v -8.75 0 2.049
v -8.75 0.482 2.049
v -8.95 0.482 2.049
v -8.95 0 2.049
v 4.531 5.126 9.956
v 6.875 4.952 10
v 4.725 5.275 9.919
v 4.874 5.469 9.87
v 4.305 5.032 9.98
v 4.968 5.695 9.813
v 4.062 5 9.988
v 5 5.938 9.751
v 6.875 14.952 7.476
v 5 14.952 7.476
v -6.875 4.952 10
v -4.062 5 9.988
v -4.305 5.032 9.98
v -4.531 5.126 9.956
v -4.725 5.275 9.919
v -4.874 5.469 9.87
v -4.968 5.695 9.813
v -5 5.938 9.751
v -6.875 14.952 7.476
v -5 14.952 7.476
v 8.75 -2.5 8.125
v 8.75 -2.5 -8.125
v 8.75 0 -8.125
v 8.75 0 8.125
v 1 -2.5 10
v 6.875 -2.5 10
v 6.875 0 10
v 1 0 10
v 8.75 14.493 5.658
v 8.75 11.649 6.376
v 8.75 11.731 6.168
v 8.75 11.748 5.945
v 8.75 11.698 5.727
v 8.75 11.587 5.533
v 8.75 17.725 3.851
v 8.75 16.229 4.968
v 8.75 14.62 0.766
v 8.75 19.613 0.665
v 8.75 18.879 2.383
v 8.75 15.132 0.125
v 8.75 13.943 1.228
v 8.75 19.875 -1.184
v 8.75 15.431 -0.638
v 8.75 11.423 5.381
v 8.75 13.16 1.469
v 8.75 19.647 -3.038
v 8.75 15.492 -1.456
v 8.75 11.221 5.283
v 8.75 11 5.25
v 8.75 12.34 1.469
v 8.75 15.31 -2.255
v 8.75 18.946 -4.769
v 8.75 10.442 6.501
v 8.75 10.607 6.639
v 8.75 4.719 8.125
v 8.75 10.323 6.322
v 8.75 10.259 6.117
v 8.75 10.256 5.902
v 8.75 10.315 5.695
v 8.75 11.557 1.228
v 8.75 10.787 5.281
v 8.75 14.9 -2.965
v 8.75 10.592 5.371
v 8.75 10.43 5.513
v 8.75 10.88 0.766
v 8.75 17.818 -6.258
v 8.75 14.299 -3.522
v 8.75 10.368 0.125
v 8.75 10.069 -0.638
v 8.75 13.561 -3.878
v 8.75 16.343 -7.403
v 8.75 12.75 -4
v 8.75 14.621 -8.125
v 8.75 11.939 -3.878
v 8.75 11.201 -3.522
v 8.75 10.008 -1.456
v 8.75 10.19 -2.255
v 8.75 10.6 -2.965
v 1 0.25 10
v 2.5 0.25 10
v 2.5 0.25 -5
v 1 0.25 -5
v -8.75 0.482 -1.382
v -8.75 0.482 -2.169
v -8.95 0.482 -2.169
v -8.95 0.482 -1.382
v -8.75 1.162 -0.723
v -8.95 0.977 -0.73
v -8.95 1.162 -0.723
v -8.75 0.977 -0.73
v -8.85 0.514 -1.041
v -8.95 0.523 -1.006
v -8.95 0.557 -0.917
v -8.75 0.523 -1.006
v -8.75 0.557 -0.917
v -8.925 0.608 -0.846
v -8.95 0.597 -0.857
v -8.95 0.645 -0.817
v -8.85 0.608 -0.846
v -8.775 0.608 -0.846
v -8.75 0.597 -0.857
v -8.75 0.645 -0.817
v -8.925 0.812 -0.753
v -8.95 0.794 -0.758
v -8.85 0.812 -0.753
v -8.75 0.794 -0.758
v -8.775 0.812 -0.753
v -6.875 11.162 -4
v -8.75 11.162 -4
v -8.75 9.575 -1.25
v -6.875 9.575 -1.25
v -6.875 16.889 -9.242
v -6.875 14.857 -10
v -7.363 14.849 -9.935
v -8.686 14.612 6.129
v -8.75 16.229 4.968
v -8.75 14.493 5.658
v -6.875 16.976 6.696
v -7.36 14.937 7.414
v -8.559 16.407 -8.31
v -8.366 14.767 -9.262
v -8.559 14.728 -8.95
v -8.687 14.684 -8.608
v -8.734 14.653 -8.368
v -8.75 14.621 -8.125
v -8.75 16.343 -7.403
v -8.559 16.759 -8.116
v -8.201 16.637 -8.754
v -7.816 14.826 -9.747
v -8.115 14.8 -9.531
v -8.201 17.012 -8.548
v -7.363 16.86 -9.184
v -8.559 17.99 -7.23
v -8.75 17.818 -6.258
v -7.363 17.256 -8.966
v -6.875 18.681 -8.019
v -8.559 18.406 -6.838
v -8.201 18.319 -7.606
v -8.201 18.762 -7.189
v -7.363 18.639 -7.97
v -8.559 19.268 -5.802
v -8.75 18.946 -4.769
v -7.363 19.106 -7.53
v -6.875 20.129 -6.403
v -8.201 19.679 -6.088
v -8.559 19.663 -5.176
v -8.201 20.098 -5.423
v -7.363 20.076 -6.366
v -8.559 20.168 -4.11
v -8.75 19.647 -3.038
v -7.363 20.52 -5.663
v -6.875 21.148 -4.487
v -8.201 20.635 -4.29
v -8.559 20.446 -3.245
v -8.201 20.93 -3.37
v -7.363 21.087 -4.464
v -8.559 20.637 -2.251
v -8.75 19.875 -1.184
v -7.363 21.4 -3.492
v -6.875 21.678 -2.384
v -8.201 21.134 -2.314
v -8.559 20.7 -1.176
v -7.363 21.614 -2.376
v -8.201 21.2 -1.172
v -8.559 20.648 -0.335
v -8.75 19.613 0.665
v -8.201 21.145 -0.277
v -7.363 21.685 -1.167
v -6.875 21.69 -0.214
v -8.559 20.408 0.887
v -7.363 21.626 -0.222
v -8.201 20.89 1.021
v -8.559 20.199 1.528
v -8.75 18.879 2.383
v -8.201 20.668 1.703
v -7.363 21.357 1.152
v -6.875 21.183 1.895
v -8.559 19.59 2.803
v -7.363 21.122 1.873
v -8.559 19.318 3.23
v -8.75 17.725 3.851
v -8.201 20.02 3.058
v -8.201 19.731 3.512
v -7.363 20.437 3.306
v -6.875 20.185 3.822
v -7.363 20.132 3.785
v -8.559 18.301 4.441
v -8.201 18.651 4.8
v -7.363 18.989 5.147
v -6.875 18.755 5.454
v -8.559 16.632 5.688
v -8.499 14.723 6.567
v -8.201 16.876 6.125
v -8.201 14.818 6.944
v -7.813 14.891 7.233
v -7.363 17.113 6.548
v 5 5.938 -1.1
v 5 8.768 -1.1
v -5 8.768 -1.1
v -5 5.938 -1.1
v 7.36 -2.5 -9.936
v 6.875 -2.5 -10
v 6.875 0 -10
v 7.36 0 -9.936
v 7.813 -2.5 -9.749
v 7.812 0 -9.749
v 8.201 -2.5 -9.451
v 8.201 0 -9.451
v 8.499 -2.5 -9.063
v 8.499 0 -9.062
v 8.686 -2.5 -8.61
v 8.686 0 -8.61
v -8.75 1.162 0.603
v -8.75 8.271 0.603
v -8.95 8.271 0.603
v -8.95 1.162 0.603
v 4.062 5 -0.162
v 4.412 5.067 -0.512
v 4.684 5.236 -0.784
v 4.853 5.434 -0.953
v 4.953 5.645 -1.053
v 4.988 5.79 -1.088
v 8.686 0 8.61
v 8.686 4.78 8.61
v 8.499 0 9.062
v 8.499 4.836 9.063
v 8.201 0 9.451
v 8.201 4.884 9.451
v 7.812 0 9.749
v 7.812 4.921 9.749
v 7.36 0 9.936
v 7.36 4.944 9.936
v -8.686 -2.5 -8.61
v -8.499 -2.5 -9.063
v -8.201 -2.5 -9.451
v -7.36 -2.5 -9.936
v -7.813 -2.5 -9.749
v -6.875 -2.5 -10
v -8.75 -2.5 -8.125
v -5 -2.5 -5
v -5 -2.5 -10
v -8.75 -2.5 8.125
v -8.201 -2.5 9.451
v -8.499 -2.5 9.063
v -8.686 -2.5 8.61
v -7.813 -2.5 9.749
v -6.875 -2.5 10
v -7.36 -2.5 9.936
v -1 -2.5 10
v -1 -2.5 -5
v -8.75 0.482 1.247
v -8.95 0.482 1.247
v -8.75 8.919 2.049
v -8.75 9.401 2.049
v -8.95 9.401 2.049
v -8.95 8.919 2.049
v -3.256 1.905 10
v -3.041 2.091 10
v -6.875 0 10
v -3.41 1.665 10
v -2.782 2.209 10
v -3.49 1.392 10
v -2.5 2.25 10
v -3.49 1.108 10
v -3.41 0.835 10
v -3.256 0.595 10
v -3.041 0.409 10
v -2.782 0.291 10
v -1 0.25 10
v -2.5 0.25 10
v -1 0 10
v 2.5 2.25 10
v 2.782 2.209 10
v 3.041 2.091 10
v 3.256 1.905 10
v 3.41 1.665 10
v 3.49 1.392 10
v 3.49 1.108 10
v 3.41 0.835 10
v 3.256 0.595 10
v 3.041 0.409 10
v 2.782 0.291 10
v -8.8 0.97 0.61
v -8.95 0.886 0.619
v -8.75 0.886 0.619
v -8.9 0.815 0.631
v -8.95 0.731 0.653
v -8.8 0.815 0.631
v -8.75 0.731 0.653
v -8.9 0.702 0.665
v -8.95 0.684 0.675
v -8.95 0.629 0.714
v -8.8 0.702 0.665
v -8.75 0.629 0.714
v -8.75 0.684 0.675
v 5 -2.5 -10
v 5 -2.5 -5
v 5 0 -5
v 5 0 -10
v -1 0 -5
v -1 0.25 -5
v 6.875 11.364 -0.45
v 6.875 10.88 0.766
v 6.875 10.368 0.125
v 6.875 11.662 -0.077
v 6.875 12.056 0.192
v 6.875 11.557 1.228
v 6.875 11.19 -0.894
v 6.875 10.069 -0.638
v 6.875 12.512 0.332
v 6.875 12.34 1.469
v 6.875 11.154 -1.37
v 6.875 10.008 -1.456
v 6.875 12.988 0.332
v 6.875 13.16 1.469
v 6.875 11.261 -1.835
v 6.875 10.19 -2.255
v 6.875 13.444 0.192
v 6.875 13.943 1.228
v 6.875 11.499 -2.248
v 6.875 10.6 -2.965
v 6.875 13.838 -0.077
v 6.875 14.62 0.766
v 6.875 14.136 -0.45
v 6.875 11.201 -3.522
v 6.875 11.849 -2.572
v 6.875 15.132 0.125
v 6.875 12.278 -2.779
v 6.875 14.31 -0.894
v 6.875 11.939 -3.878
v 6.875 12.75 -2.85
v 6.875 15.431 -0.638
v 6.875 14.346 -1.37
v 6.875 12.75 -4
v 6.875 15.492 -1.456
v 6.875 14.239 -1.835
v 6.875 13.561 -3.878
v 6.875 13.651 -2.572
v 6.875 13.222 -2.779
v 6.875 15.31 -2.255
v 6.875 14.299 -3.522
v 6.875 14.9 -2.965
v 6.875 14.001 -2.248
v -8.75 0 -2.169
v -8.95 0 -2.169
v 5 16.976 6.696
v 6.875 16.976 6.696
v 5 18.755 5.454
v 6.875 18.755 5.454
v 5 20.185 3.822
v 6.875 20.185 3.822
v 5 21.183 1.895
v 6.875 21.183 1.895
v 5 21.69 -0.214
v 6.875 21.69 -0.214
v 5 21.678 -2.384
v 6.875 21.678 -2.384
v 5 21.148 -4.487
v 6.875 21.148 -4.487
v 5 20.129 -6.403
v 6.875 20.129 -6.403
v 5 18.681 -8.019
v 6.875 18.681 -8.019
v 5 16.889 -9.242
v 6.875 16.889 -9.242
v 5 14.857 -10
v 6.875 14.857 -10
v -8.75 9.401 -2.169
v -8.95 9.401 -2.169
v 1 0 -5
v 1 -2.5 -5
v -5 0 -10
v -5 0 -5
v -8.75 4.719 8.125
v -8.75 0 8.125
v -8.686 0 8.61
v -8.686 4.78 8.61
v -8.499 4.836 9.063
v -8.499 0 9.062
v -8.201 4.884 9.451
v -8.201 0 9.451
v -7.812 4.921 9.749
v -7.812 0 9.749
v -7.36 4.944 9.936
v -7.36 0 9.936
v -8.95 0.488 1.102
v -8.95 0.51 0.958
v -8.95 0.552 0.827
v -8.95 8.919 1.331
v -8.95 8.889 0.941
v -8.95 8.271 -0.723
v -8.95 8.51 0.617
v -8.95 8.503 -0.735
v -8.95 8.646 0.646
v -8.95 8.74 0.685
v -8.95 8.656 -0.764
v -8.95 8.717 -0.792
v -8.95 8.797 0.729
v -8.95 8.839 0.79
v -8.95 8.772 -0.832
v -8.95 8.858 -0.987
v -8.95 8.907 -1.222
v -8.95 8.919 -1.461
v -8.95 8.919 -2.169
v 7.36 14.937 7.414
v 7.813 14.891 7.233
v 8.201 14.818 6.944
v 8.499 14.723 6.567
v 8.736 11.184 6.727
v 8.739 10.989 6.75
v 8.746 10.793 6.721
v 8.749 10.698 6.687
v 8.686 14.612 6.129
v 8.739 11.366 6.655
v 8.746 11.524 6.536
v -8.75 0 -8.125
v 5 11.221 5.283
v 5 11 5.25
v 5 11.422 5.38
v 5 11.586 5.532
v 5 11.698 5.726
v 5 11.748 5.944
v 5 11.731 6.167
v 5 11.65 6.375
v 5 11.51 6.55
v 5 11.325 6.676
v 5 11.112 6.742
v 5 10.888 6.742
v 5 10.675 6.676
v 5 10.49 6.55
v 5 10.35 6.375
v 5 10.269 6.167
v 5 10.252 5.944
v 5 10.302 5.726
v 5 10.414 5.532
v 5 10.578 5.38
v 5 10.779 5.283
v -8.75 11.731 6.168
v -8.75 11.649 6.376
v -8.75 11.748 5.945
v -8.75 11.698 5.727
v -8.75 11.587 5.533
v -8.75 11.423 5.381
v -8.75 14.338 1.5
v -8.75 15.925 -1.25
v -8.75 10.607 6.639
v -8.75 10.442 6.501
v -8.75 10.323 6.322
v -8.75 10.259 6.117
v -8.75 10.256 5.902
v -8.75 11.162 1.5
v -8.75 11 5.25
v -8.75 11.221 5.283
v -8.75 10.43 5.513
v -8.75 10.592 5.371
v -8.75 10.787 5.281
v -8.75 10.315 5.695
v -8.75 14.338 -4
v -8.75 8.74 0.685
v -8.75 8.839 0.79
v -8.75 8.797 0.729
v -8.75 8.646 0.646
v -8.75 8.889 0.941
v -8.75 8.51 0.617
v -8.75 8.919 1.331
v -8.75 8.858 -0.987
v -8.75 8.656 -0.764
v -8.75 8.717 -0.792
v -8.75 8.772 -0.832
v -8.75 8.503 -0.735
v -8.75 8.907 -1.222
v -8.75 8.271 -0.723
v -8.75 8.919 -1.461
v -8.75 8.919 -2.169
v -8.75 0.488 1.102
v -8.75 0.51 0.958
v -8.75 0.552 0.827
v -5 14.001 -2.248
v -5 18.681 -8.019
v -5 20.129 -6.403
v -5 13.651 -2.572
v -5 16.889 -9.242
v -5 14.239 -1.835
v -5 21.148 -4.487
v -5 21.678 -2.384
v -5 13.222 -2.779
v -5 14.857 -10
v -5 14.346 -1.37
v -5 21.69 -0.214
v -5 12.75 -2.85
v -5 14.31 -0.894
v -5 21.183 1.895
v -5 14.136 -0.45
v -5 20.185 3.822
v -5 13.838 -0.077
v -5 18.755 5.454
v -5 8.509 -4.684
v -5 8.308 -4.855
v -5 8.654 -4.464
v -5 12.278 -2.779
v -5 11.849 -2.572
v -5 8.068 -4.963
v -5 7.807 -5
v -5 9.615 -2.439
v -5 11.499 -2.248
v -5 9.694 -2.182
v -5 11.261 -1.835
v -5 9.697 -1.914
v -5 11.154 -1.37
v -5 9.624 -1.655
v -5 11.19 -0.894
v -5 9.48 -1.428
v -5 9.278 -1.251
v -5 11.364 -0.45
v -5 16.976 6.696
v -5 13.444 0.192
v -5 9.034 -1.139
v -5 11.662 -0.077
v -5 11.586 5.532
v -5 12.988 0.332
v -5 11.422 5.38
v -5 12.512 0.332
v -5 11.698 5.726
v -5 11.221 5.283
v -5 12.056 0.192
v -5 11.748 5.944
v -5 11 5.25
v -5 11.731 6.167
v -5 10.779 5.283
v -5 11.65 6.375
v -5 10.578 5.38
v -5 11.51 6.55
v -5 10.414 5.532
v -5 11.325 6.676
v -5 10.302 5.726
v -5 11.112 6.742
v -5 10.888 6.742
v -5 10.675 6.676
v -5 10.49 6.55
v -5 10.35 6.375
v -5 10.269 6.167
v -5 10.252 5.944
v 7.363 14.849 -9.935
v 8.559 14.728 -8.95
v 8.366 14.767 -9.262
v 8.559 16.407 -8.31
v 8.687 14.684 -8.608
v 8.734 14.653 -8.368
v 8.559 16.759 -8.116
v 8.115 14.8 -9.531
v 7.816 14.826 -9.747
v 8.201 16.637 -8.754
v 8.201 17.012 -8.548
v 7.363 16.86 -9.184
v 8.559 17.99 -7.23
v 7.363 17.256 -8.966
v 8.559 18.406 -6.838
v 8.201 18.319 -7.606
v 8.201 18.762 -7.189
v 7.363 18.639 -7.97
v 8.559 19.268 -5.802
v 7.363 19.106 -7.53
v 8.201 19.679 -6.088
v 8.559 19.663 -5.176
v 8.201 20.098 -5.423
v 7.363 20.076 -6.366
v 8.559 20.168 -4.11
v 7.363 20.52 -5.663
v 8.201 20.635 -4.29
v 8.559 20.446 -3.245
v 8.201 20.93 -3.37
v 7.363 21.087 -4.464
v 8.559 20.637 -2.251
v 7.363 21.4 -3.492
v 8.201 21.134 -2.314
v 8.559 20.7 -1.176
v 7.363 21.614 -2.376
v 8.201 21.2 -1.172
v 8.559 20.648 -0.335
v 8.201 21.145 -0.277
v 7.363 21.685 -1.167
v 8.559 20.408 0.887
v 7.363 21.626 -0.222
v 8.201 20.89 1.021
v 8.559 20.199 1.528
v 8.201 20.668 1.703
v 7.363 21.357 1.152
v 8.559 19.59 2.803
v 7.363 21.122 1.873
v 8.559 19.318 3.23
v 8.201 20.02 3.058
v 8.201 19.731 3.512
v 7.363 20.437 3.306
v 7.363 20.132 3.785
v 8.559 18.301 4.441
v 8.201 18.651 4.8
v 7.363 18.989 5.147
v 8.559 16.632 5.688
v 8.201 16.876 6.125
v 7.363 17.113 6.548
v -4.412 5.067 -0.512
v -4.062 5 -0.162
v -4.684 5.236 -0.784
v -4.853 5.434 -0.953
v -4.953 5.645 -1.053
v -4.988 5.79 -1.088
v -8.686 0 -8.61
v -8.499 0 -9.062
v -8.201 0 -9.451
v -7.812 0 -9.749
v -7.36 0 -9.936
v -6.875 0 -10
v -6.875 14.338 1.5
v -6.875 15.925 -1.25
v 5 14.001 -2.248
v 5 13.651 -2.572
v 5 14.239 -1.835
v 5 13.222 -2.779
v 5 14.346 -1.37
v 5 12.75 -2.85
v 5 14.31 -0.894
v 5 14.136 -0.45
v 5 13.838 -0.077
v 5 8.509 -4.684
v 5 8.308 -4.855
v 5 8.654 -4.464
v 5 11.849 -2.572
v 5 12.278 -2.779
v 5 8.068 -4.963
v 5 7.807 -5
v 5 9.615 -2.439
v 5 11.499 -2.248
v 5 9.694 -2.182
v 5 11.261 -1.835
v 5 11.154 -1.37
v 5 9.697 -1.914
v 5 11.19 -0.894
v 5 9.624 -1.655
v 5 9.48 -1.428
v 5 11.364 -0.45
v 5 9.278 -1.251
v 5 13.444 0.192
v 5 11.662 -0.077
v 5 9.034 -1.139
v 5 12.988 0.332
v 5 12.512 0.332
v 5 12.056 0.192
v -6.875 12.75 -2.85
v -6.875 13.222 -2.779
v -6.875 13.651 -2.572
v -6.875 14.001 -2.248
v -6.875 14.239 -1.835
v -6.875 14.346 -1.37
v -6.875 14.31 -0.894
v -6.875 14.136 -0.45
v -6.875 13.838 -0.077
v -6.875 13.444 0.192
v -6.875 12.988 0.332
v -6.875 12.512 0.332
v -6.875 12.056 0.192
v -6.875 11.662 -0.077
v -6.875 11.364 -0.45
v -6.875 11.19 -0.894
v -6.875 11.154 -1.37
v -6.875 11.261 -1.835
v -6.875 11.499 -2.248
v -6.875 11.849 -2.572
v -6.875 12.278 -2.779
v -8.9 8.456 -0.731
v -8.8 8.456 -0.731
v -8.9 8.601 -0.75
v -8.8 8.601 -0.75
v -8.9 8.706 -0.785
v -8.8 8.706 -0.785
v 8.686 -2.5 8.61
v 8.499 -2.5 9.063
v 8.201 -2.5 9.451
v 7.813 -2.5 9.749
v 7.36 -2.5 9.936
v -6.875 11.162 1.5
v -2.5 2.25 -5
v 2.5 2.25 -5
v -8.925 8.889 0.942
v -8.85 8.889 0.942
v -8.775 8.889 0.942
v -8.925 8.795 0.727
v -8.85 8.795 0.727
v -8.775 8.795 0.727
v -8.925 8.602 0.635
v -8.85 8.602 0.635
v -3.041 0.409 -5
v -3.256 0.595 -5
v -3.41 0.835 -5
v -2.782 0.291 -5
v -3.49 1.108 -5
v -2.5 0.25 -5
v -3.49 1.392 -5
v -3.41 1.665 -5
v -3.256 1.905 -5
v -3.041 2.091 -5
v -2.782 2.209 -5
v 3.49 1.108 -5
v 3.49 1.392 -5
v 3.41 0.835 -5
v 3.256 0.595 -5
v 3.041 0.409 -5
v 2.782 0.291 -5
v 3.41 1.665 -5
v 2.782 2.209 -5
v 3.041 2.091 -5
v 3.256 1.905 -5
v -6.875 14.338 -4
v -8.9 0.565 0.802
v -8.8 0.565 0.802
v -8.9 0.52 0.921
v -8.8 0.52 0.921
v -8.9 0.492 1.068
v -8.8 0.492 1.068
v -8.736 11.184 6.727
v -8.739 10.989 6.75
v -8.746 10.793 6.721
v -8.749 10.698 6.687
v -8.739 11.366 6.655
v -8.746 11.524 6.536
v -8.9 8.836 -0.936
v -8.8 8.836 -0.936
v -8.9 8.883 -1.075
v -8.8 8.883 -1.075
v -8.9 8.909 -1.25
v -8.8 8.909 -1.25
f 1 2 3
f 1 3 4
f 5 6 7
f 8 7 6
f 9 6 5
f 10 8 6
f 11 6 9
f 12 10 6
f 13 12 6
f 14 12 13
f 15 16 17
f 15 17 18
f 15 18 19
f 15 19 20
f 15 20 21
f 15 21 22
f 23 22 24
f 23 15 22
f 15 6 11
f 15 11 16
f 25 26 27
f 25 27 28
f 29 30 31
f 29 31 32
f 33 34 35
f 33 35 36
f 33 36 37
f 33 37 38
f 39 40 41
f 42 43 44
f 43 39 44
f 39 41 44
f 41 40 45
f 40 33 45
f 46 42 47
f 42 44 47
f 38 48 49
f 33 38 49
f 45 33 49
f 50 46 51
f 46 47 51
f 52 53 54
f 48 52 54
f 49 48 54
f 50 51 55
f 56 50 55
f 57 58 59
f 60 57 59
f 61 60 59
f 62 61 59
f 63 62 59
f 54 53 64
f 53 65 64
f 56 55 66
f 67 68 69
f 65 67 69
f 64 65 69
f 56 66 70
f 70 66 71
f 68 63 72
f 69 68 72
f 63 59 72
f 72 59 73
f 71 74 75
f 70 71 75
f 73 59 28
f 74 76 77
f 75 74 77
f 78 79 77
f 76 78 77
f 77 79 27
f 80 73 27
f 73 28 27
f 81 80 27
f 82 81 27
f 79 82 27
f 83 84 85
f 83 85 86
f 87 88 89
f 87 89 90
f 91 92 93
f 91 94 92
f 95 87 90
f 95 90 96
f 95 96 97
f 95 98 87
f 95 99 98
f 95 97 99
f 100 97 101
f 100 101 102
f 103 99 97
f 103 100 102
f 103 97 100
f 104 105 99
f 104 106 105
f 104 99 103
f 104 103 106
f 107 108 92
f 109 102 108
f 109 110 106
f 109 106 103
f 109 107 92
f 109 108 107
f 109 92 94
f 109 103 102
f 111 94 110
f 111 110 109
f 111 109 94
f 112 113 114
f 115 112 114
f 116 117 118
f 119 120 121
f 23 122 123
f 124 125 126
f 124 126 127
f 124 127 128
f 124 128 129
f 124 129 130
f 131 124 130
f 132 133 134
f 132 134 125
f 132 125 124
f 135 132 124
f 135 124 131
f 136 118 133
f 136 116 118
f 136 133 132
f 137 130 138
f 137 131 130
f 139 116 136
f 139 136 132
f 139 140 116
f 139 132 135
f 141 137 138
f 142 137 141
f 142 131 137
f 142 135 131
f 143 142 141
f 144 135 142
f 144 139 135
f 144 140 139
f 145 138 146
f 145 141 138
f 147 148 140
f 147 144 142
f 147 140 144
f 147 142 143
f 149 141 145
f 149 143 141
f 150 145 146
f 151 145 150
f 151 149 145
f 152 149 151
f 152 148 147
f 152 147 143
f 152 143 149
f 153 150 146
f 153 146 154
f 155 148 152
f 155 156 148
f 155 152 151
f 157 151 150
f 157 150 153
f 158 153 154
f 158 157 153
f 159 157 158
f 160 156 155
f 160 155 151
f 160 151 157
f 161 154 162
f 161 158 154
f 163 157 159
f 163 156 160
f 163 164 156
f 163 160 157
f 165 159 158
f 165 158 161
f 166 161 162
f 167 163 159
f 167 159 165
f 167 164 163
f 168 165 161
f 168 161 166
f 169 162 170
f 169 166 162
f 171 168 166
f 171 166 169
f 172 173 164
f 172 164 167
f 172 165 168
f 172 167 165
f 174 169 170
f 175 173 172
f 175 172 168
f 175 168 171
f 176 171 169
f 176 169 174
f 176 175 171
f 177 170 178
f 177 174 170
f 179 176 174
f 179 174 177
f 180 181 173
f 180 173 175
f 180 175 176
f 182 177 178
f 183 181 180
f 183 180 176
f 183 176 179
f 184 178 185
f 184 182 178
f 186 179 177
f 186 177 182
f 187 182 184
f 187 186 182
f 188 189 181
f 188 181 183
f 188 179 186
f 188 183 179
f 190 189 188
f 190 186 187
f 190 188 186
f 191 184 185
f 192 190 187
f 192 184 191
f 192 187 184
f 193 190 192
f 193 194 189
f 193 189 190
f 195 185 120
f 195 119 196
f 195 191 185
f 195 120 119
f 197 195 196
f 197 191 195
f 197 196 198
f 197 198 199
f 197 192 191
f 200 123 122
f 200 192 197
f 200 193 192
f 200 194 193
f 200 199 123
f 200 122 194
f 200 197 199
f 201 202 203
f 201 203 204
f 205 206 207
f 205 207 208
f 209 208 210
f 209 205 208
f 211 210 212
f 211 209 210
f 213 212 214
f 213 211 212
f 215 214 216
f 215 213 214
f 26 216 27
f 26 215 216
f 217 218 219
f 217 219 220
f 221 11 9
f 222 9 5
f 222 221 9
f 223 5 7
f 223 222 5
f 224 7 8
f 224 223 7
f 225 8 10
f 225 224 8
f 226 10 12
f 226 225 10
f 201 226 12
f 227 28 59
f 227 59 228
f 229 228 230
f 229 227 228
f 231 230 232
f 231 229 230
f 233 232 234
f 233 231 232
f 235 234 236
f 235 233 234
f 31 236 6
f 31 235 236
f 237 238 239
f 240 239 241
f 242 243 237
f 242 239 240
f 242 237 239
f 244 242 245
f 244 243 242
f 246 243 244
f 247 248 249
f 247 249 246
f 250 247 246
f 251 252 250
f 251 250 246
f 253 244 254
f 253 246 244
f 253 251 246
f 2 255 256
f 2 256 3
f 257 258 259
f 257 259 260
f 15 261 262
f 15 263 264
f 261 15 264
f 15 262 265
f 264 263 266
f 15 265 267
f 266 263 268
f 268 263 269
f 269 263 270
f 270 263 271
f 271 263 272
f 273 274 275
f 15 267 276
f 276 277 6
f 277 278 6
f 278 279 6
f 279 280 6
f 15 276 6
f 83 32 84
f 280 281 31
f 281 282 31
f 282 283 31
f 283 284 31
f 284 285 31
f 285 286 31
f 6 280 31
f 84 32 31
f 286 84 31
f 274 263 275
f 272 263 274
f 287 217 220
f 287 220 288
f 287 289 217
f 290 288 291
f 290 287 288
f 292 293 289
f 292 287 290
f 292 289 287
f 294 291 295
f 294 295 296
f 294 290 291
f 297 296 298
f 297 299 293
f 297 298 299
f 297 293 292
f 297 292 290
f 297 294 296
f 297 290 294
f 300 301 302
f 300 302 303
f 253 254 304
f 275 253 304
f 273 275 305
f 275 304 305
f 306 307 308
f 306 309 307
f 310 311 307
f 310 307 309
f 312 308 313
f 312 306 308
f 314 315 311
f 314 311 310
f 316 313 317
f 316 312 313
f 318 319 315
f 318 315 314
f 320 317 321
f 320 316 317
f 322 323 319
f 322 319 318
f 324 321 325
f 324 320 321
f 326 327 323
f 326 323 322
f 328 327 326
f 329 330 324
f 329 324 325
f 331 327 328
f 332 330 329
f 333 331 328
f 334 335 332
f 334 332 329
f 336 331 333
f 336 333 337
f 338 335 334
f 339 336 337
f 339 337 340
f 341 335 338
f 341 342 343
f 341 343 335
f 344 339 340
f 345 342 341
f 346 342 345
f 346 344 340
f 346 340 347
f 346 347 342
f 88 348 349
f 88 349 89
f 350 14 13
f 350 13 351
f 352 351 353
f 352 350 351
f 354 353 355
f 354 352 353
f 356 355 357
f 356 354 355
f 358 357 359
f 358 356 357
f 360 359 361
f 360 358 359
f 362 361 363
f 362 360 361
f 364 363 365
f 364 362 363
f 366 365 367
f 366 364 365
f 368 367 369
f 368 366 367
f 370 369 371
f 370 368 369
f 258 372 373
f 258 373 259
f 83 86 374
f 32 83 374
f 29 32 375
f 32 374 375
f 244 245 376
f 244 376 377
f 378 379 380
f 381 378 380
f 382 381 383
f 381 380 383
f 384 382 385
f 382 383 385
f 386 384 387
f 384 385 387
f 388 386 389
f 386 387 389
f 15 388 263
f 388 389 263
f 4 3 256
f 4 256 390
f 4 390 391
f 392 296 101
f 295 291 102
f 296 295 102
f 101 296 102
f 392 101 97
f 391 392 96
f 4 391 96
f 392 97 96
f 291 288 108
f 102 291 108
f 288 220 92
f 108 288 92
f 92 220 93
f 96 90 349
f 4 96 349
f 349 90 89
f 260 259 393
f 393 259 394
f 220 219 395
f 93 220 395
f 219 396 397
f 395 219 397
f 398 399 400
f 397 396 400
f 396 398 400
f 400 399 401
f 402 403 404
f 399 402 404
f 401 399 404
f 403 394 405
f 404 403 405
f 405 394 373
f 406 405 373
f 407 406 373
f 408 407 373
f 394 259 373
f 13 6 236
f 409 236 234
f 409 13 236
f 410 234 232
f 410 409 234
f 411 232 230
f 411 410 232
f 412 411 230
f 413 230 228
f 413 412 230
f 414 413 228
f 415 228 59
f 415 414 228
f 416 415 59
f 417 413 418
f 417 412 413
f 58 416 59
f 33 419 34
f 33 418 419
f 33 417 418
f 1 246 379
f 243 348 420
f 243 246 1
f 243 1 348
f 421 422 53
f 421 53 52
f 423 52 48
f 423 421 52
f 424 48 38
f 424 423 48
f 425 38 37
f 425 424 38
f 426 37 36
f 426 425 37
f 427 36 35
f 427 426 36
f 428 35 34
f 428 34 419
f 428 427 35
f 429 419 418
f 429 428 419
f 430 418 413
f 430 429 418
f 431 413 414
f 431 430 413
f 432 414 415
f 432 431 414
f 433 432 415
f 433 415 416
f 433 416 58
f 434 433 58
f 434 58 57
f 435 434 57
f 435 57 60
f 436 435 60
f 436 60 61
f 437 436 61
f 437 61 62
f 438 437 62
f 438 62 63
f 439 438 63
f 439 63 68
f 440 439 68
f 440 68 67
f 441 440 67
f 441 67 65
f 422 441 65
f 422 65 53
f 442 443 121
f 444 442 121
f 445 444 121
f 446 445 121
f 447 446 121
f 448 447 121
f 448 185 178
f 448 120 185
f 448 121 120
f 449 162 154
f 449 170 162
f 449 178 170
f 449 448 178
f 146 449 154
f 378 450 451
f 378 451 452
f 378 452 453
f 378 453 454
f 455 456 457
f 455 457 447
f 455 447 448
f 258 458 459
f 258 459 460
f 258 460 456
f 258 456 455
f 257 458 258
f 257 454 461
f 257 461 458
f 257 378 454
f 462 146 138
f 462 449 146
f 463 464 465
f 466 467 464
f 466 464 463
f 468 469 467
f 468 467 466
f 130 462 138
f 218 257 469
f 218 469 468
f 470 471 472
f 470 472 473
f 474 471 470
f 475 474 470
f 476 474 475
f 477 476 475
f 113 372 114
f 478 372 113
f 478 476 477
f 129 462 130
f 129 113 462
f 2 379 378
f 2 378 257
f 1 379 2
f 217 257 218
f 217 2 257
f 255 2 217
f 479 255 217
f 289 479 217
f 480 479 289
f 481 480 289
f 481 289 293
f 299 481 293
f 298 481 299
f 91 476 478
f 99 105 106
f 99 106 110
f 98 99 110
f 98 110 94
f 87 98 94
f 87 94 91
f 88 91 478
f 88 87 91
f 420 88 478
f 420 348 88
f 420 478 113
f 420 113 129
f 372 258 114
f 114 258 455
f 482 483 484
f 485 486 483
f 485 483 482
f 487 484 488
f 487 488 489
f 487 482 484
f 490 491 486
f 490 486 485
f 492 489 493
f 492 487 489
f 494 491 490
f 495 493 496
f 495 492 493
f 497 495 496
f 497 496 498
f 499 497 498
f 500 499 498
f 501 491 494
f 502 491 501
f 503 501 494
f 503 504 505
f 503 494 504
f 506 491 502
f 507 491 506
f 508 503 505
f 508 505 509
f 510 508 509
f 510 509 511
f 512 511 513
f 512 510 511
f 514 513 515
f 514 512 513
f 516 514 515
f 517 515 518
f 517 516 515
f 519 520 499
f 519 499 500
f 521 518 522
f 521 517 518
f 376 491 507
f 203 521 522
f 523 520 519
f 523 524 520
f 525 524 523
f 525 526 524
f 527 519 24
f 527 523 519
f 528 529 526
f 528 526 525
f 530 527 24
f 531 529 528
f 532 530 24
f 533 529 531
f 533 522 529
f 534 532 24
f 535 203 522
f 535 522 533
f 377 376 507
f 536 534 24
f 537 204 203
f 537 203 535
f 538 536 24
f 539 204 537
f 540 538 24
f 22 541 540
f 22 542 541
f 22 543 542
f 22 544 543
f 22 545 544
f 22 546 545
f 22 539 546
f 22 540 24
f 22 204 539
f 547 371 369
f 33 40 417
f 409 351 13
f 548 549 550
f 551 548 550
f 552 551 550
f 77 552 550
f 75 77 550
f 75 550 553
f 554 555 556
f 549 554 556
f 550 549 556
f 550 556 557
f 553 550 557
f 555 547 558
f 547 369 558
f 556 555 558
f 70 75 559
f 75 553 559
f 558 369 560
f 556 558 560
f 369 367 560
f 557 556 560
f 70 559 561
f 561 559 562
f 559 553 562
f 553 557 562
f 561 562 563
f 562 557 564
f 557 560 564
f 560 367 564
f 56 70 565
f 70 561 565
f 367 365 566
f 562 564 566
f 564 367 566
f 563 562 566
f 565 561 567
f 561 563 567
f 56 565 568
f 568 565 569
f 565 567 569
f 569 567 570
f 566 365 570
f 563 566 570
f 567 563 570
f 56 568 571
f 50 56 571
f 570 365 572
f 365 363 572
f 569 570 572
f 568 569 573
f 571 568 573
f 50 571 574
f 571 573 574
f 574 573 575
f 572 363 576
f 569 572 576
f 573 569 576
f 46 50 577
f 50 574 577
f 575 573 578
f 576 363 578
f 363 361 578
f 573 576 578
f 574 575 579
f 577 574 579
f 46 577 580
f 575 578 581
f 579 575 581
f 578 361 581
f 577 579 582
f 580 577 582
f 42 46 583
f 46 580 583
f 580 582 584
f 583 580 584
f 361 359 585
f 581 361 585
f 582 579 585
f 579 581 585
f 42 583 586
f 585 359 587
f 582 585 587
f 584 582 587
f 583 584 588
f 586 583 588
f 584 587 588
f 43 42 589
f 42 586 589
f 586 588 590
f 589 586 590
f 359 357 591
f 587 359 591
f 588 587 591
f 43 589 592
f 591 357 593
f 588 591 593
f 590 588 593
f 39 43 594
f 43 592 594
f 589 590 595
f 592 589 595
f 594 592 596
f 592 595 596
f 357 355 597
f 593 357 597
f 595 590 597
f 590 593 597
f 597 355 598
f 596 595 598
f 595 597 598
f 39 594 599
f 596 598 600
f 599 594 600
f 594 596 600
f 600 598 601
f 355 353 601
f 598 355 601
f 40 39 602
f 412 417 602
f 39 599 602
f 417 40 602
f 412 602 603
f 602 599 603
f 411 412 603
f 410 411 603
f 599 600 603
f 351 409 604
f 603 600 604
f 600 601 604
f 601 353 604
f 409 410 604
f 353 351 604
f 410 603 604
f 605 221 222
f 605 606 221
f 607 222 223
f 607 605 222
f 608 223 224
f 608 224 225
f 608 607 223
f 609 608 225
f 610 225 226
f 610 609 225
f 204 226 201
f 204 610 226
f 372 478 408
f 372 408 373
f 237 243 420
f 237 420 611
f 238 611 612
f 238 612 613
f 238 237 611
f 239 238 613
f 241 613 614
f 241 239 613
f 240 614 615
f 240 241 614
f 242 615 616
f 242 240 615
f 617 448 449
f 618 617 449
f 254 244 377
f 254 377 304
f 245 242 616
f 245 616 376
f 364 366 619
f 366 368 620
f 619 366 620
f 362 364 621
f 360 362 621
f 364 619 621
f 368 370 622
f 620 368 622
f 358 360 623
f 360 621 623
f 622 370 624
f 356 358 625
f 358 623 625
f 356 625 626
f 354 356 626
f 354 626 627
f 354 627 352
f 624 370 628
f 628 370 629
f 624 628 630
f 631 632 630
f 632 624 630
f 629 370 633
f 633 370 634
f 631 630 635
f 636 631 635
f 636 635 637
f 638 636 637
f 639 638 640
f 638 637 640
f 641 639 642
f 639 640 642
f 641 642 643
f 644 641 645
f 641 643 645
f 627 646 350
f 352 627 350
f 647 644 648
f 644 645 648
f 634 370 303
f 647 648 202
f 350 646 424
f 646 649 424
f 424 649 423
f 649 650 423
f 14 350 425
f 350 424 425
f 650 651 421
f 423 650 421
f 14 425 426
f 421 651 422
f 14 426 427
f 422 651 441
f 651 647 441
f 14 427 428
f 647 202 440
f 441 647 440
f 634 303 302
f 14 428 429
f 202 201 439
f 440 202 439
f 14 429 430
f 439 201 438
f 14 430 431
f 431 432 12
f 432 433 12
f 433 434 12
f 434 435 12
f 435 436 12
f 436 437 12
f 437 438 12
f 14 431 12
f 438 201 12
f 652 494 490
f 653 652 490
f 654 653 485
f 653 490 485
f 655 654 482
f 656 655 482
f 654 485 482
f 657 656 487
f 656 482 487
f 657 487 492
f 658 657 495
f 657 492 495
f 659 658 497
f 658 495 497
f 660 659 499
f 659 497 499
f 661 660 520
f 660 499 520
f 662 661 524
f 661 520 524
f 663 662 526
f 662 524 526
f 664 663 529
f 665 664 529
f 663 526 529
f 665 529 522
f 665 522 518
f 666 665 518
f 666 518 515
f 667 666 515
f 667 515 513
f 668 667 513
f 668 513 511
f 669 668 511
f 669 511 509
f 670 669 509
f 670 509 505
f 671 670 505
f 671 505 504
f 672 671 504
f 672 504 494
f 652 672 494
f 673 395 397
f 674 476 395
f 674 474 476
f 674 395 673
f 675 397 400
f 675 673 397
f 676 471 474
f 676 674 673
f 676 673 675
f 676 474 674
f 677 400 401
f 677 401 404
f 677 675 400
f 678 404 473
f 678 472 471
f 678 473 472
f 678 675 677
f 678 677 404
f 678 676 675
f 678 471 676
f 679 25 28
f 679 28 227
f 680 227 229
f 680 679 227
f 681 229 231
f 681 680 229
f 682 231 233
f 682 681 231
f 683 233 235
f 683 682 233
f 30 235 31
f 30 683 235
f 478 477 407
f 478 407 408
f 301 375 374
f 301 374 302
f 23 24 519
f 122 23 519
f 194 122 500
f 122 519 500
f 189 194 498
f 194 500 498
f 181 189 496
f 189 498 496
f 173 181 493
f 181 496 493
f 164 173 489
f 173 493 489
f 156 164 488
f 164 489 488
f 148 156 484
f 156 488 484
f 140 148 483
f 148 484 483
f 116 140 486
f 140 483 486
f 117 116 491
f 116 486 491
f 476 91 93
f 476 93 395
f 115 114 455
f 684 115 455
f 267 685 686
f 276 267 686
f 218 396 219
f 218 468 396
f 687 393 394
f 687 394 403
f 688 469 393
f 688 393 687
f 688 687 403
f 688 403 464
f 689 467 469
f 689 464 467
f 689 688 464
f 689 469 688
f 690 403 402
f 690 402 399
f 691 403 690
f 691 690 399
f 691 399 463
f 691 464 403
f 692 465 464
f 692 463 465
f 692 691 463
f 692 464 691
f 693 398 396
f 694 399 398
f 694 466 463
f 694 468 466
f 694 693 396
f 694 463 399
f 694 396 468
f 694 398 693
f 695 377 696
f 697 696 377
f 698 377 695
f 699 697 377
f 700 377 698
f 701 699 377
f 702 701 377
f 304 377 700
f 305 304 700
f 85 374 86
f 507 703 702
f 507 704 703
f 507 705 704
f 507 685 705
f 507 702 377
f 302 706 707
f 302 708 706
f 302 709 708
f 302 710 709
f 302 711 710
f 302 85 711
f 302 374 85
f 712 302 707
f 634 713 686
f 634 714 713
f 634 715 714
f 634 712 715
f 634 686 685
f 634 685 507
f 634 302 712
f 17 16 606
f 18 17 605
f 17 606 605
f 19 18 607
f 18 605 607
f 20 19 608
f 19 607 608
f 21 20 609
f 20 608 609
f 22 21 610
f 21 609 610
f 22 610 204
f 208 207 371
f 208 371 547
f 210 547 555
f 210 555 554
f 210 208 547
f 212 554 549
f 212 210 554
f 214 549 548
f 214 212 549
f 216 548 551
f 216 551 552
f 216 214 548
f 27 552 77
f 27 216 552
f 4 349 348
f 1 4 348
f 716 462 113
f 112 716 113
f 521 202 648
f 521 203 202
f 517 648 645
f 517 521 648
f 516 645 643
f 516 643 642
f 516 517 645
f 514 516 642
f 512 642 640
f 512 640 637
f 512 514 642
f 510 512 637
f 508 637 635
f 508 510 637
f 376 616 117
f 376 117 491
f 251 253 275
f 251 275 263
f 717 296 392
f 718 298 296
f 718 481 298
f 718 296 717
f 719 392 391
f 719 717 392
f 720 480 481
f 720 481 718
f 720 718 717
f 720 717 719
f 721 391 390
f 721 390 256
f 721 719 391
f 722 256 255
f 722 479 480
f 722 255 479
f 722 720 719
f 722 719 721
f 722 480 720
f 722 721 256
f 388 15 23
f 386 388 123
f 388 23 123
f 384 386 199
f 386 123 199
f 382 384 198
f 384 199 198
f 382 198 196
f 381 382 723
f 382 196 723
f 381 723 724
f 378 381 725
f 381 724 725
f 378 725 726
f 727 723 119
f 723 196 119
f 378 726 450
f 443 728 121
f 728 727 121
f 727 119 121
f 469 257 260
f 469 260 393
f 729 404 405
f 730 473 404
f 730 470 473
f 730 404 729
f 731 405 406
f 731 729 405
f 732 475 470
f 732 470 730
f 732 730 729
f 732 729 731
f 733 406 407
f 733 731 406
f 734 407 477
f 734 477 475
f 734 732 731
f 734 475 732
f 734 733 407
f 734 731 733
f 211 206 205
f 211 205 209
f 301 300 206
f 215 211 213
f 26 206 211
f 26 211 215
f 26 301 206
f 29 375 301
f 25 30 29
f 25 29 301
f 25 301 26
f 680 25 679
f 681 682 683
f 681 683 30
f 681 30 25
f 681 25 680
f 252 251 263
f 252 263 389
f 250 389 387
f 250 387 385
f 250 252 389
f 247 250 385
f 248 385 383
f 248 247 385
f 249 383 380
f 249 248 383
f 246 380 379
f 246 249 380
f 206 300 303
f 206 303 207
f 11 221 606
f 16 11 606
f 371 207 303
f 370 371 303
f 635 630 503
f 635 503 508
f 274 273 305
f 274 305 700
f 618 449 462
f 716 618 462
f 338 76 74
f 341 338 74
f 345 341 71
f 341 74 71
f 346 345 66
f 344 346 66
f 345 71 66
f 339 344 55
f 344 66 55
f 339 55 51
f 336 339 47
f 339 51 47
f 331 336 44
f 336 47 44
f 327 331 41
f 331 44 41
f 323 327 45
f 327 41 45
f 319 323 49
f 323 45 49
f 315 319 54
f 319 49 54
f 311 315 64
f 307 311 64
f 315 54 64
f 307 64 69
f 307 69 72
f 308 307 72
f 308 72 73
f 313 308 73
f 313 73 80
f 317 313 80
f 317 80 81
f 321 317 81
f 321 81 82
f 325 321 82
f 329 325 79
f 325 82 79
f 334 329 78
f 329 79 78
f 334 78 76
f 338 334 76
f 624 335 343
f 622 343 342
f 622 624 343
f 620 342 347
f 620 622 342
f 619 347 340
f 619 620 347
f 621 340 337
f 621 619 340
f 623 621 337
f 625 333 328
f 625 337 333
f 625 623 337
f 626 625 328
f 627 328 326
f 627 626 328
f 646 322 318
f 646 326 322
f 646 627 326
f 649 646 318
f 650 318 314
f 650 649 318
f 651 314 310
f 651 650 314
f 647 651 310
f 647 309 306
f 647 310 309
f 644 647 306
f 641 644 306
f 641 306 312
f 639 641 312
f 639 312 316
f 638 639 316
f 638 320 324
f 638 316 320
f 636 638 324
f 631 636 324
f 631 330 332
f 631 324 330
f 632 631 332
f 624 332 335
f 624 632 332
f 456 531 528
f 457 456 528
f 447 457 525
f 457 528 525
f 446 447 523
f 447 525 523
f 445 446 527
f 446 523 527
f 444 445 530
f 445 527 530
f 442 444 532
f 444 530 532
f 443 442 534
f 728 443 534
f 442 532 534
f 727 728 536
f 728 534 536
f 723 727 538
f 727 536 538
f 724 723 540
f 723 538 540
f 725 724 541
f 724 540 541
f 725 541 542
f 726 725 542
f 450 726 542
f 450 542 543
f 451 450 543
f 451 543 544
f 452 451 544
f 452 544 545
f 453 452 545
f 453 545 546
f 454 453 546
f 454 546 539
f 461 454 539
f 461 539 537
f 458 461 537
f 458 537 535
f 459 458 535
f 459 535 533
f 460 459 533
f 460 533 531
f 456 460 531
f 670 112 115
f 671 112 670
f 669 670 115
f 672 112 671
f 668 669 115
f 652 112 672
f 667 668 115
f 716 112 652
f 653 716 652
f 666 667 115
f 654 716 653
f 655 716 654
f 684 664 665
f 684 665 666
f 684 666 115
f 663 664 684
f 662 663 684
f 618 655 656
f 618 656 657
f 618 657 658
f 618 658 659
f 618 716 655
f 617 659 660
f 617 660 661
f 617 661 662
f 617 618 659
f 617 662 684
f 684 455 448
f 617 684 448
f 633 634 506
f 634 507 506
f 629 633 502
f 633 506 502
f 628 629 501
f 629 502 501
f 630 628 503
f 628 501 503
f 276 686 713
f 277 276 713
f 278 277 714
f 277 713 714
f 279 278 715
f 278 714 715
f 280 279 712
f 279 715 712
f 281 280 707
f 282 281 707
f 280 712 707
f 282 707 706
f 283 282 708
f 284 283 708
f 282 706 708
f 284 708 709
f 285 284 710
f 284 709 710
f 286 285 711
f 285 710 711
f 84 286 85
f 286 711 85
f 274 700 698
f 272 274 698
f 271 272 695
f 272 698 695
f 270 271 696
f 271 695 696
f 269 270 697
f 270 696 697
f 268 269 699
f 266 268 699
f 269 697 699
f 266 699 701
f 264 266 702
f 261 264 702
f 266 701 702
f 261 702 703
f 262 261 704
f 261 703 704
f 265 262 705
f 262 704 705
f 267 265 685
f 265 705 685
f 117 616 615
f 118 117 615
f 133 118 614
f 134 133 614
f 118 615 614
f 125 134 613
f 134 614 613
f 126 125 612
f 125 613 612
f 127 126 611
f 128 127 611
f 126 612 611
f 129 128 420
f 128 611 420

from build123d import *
from build123d.topology import SkipClean

# Parameters (mm, degrees)
BOSS_EXTRUDE1_DEPTH = 22.5
SKETCH3_W           = 10
SKETCH3_H           = 20
CUT_EXTRUDE1_DEPTH  = 17.5
SKETCH4_OUTSIDE_W   = 28.964
SKETCH4_OUTSIDE_H   = 31.464
SKETCH4_OUTSIDE_R   = 1.6
SKETCH4_OUTSIDE_R_2 = 0.75
CUT_EXTRUDE2_DEPTH  = 31.207614934
FILLET1_R           = 1.875
SKETCH7_W           = 20
SKETCH7_H           = 25
CUT_EXTRUDE4_DEPTH  = 8.75
BOSS_EXTRUDE3_DEPTH = 5
FILLET2_R           = 0.9375
SKETCH11_R          = 2.75
CUT_EXTRUDE6_DEPTH  = 1.875
CUT_EXTRUDE7_DEPTH  = 1.875
BOSS_EXTRUDE4_DEPTH = 0.2
BOSS_EXTRUDE9_START = 2.5
BOSS_EXTRUDE9_DEPTH = 2.5
CUT_EXTRUDE8_DEPTH  = 28.895609137


with BuildPart() as part:
    # Sketch2 → Boss-Extrude1 (new body)
    with BuildSketch(Plane(origin=(0, 0, 0), x_dir=(1, 0, 0), z_dir=(0, 1, 0))):
        Polygon((5, 10), (8.75, 10), (8.75, -10), (-8.75, -10), (-8.75, 10), (-5, 10), (-5, 5), (5, 5), align=None)
    extrude(amount=BOSS_EXTRUDE1_DEPTH)

    # Sketch3 → Cut-Extrude1 (cut)
    with BuildSketch(Plane(origin=(0, 22.5, 0), x_dir=(1, 0, 0), z_dir=(0, 1, 0))):
        Rectangle(SKETCH3_W, SKETCH3_H)
    extrude(amount=-CUT_EXTRUDE1_DEPTH, mode=Mode.SUBTRACT)

    # Sketch4 outside → Cut-Extrude2 (cut, through all)
    # profile 1 of 3: a face of its own
    with BuildSketch(Plane(origin=(8.75, 0, 0), x_dir=(0, 0, -1), z_dir=(1, 0, 0))):
        with Locations((0, 11.25)):
            Rectangle(SKETCH4_OUTSIDE_W, SKETCH4_OUTSIDE_H)
        with BuildLine():
            Line((10, 14.856537443), (10, 0))
            Line((10, 0), (-10, 0))
            Line((-10, 0), (-10, 4.952182367))
            Line((-10, 4.952182367), (-7.476419244, 14.952182367))
            ThreePointArc((-7.476419244, 14.952182367), (1.29925445, 21.749865221), (10, 14.856537443))
        make_face(mode=Mode.SUBTRACT)
    # profile 2 of 3: a face of its own
    with BuildSketch(Plane(origin=(8.75, 0, 0), x_dir=(0, 0, -1), z_dir=(1, 0, 0))):
        with Locations((1.25, 12.75)):
            Circle(SKETCH4_OUTSIDE_R)
    # profile 3 of 3: a face of its own
    with BuildSketch(Plane(origin=(8.75, 0, 0), x_dir=(0, 0, -1), z_dir=(1, 0, 0))):
        with Locations((-6, 11)):
            Circle(SKETCH4_OUTSIDE_R_2)
    extrude(amount=-CUT_EXTRUDE2_DEPTH, mode=Mode.SUBTRACT)

    # Fillet1
    # the kernel refuses this fillet: 1.875 mm, written as the material it takes off along each edge
    with BuildSketch(Plane(origin=(-8.75, -1.875, 10), x_dir=(1, 0, 0), z_dir=(0, 1, 0)), Plane(origin=(8.75, -1.875, 10), x_dir=(0, 0, -1), z_dir=(0, 1, 0))) as fillet1_piece_1:
        with BuildLine():
            CenterArc((FILLET1_R, FILLET1_R), FILLET1_R, 180, 90)
            Line((0, FILLET1_R), (-FILLET1_R * 0.02, FILLET1_R))
            Line((-FILLET1_R * 0.02, FILLET1_R), (-FILLET1_R * 0.02, -FILLET1_R * 0.02))
            Line((-FILLET1_R * 0.02, -FILLET1_R * 0.02), (FILLET1_R, -FILLET1_R * 0.02))
            Line((FILLET1_R, -FILLET1_R * 0.02), (FILLET1_R, 0))
        make_face()
    extrude(amount=8.702182367, mode=Mode.SUBTRACT)
    with BuildSketch(Plane(origin=(-8.75, -1.875, -10), x_dir=(0, 0, 1), z_dir=(0, 1, 0)), Plane(origin=(8.75, -1.875, -10), x_dir=(-1, 0, 0), z_dir=(0, 1, 0))) as fillet1_piece_2:
        with BuildLine():
            CenterArc((FILLET1_R, FILLET1_R), FILLET1_R, 180, 90)
            Line((0, FILLET1_R), (-FILLET1_R * 0.02, FILLET1_R))
            Line((-FILLET1_R * 0.02, FILLET1_R), (-FILLET1_R * 0.02, -FILLET1_R * 0.02))
            Line((-FILLET1_R * 0.02, -FILLET1_R * 0.02), (FILLET1_R, -FILLET1_R * 0.02))
            Line((FILLET1_R, -FILLET1_R * 0.02), (FILLET1_R, 0))
        make_face()
    extrude(amount=18.606537443, mode=Mode.SUBTRACT)
    with BuildSketch(Plane(origin=(8.75, 12.75, -1.25), x_dir=(0, 0.2446869297035112, 0.9696021382156028), z_dir=(0, -0.9696021382156028, 0.2446869297035112))) as fillet1_piece_3:
        with BuildLine():
            CenterArc((9 - FILLET1_R, FILLET1_R), FILLET1_R, 270, 90)
            Line((9, FILLET1_R), (9 + FILLET1_R * 0.02, FILLET1_R))
            Line((9 + FILLET1_R * 0.02, FILLET1_R), (9 + FILLET1_R * 0.02, -FILLET1_R * 0.02))
            Line((9 + FILLET1_R * 0.02, -FILLET1_R * 0.02), (9 - FILLET1_R, -FILLET1_R * 0.02))
            Line((9 - FILLET1_R, -FILLET1_R * 0.02), (9 - FILLET1_R, 0))
        make_face()
    revolve(axis=Axis((8.75, 12.75, -1.25), (-1, 0, 0)), revolution_arc=164.250823416, mode=Mode.SUBTRACT)
    with BuildSketch(Plane(origin=(-8.75, 12.75, -1.25), x_dir=(0, 0.027674657987308005, -0.9996169833017472), z_dir=(0, -0.9996169833017472, -0.027674657987308005))) as fillet1_piece_4:
        with BuildLine():
            CenterArc((9 - FILLET1_R, FILLET1_R), FILLET1_R, 270, 90)
            Line((9, FILLET1_R), (9 + FILLET1_R * 0.02, FILLET1_R))
            Line((9 + FILLET1_R * 0.02, FILLET1_R), (9 + FILLET1_R * 0.02, -FILLET1_R * 0.02))
            Line((9 + FILLET1_R * 0.02, -FILLET1_R * 0.02), (9 - FILLET1_R, -FILLET1_R * 0.02))
            Line((9 - FILLET1_R, -FILLET1_R * 0.02), (9 - FILLET1_R, 0))
        make_face()
    revolve(axis=Axis((-8.75, 12.75, -1.25), (1, 0, 0)), revolution_arc=164.250823416, mode=Mode.SUBTRACT)
    with BuildSketch(Plane(origin=(-8.75, 14.952182367, 7.476419244), x_dir=(0, -0.2446869297035113, -0.9696021382156028), z_dir=(0, -0.9696021382156028, 0.24468692970351133)), Plane(origin=(8.75, 3.134178358, 10.458787993), x_dir=(0, -0.24468692970351133, -0.9696021382156028), z_dir=(0, 0.9696021382156028, -0.24468692970351133))) as fillet1_piece_5:
        with BuildLine():
            CenterArc((FILLET1_R, FILLET1_R), FILLET1_R, 180, 90)
            Line((0, FILLET1_R), (-FILLET1_R * 0.02, FILLET1_R))
            Line((-FILLET1_R * 0.02, FILLET1_R), (-FILLET1_R * 0.02, -FILLET1_R * 0.02))
            Line((-FILLET1_R * 0.02, -FILLET1_R * 0.02), (FILLET1_R, -FILLET1_R * 0.02))
            Line((FILLET1_R, -FILLET1_R * 0.02), (FILLET1_R, 0))
        make_face()
    extrude(amount=12.188508609, mode=Mode.SUBTRACT)

    # Sketch7 → Cut-Extrude4 (cut)
    with BuildSketch(Plane(origin=(8.75, 0, 0), x_dir=(0, 0, -1), z_dir=(1, 0, 0))):
        with Locations((0, 12.5)):
            Rectangle(SKETCH7_W, SKETCH7_H)
    extrude(amount=-CUT_EXTRUDE4_DEPTH, mode=Mode.SUBTRACT)

    # Sketch8 → Boss-Extrude3 (add)
    with BuildSketch(Plane(origin=(-5, 0, 0), x_dir=(0, 0, -1), z_dir=(1, 0, 0))):
        Polygon((5, 5), (5, 8.4), (1.1, 10.25), (1.1, 5), align=None)
    extrude(amount=BOSS_EXTRUDE3_DEPTH)

    # Fillet2
    fillet2_edges = [part.edges().sort_by_distance(p)[0] for p in [
        (-5, 5, 4.443966417),
        (-2.5, 10.25, -1.1),
        (-2.5, 8.4, -5),
        (-2.5, 5, -1.1),
    ]]
    fillet(fillet2_edges, radius=FILLET2_R)

    # Mirror2: part across plane


with BuildPart() as part_1:
    add(part.part)
    add(part.part.mirror(Plane.ZY))

    # Sketch11 → Cut-Extrude6 (cut)
    with BuildSketch(Plane(origin=(8.75, 0, 0), x_dir=(0, 0, -1), z_dir=(1, 0, 0))):
        with Locations((1.25, 12.75)):
            Circle(SKETCH11_R)
    extrude(amount=-CUT_EXTRUDE6_DEPTH, mode=Mode.SUBTRACT)

    # Sketch12 → Cut-Extrude7 (cut)
    with BuildSketch(Plane.ZY.offset(8.75)):
        Polygon((-1.25, 15.925426481), (-4, 14.33771324), (-4, 11.16228676), (-1.25, 9.574573519), (1.5, 11.16228676), (1.5, 14.33771324), align=None)
    extrude(amount=-CUT_EXTRUDE7_DEPTH, mode=Mode.SUBTRACT)

    # Sketch13 → Boss-Extrude4 (add)
    with BuildSketch(Plane.ZY.offset(8.75)):
        with BuildLine():
            Line((-2.16945613, 9.400976563), (2.048930789, 9.400976563))
            Line((2.048930789, 9.400976563), (2.048930789, 8.9188752))
            Line((2.048930789, 8.9188752), (1.331428371, 8.9188752))
            add(Edge.make_bspline(
                [(1.331428371, 8.9188752), (1.259186082, 8.917703873), (1.128695628, 8.915588118), (0.953618084, 8.895075924), (0.820795157, 8.85890692), (0.722620482, 8.801340017), (0.66418865, 8.710271847), (0.629489236, 8.592812055), (0.605081268, 8.443393165), (0.603495672, 8.332064189), (0.602626703, 8.271051495)],
                knots=[0, 0, 0, 0, 1.473035235, 2.660727346, 3.584016889, 4.269332832, 4.922698946, 5.732321762, 6.757222385, 8, 8, 8, 8], degree=3))
            Line((0.602626703, 8.271051495), (0.602626703, 1.161939611))
            add(Edge.make_bspline(
                [(0.602626703, 1.161939611), (0.603806075, 1.097741152), (0.605941327, 0.981509859), (0.626332927, 0.828112382), (0.653959528, 0.708007797), (0.695819757, 0.652674401), (0.713736001, 0.628991621)],
                knots=[0, 0, 0, 0, 1.387279159, 2.511668523, 3.362991788, 4, 4, 4, 4], degree=3))
            add(Edge.make_bspline(
                [(0.713736001, 0.628991621), (0.742216021, 0.605874577), (0.803795028, 0.555891305), (0.927817777, 0.514891851), (1.077003332, 0.485769381), (1.186830669, 0.483395223), (1.246683991, 0.482101362)],
                knots=[0, 0, 0, 0, 0.773484526, 1.672414867, 2.731520698, 4, 4, 4, 4], degree=3))
            Line((1.246683991, 0.482101362), (2.048930789, 0.482101362))
            Line((2.048930789, 0.482101362), (2.048930789, 0))
            Line((2.048930789, 0), (-2.16945613, 0))
            Line((-2.16945613, 0), (-2.16945613, 0.482101362))
            Line((-2.16945613, 0.482101362), (-1.382274999, 0.482101362))
            add(Edge.make_bspline(
                [(-1.382274999, 0.482101362), (-1.31940414, 0.48301697), (-1.204997391, 0.484683112), (-1.050781582, 0.508492708), (-0.931283172, 0.545116887), (-0.839180191, 0.603218278), (-0.785035731, 0.698739607), (-0.746995159, 0.820804221), (-0.726559461, 0.979920139), (-0.7243631, 1.097246659), (-0.723152043, 1.161939611)],
                knots=[0, 0, 0, 0, 1.323224596, 2.407885381, 3.273374914, 3.948198526, 4.637756618, 5.528332226, 6.637141158, 8, 8, 8, 8], degree=3))
            Line((-0.723152043, 1.161939611), (-0.723152043, 8.271051495))
            add(Edge.make_bspline(
                [(-0.723152043, 8.271051495), (-0.724696232, 8.332673526), (-0.727462884, 8.443078849), (-0.743603421, 8.589300261), (-0.77489184, 8.700371502), (-0.815344506, 8.750765334), (-0.832378133, 8.771984942)],
                knots=[0, 0, 0, 0, 1.411879347, 2.529598496, 3.380849948, 4, 4, 4, 4], degree=3))
            add(Edge.make_bspline(
                [(-0.832378133, 8.771984942), (-0.866044035, 8.795002172), (-0.940377737, 8.845823799), (-1.084531483, 8.88950754), (-1.261441827, 8.914084364), (-1.390944762, 8.917187619), (-1.461369754, 8.9188752)],
                knots=[0, 0, 0, 0, 0.741247183, 1.636660366, 2.714792252, 4, 4, 4, 4], degree=3))
            Line((-1.461369754, 8.9188752), (-2.16945613, 8.9188752))
            Line((-2.16945613, 8.9188752), (-2.16945613, 9.400976563))
        make_face()
    extrude(amount=BOSS_EXTRUDE4_DEPTH)

    # Sketch19 → Boss-Extrude9 (add)
    with SkipClean():  # the faces are left unmerged after this step: merging them gives an invalid solid
        with BuildSketch(Plane.XZ.offset(BOSS_EXTRUDE9_START)):
            with BuildLine():
                Line((-8.75, 2.048930789), (-8.75, -2.16945613))
                Line((-8.75, -2.16945613), (-8.75, -8.125))
                ThreePointArc((-8.75, -8.125), (-8.200825215, -9.450825215), (-6.875, -10))
                Line((-6.875, -10), (-5, -10))
                Line((-5, -10), (-5, -5))
                Line((-5, -5), (5, -5))
                Line((5, -5), (5, -10))
                Line((5, -10), (6.875, -10))
                ThreePointArc((6.875, -10), (8.200825215, -9.450825215), (8.75, -8.125))
                Line((8.75, -8.125), (8.75, 8.125))
                ThreePointArc((8.75, 8.125), (8.200825215, 9.450825215), (6.875, 10))
                Line((6.875, 10), (-6.875, 10))
                ThreePointArc((-6.875, 10), (-8.200825215, 9.450825215), (-8.75, 8.125))
                Line((-8.75, 8.125), (-8.75, 2.048930789))
            make_face()
        extrude(amount=-BOSS_EXTRUDE9_DEPTH)

    # Sketch20 → Cut-Extrude8 (cut, through all)
    with SkipClean():  # the faces are left unmerged after this step: merging them gives an invalid solid
        with BuildSketch(Plane(origin=(0, 0, -5), x_dir=(-1, 0, 0), z_dir=(0, 0, -1))):
            with BuildLine():
                Line((1, 0.25), (2.5, 0.25))
                ThreePointArc((2.5, 0.25), (3.5, 1.25), (2.5, 2.25))
                Line((2.5, 2.25), (-2.5, 2.25))
                ThreePointArc((-2.5, 2.25), (-3.5, 1.25), (-2.5, 0.25))
                Line((-2.5, 0.25), (-1, 0.25))
                Line((-1, 0.25), (-1, -2.5))
                ThreePointArc((-1, -2.5), (0, -3.5), (1, -2.5))
                Line((1, -2.5), (1, 0.25))
            make_face()
        extrude(amount=-CUT_EXTRUDE8_DEPTH, mode=Mode.SUBTRACT)


solid = part_1.part
